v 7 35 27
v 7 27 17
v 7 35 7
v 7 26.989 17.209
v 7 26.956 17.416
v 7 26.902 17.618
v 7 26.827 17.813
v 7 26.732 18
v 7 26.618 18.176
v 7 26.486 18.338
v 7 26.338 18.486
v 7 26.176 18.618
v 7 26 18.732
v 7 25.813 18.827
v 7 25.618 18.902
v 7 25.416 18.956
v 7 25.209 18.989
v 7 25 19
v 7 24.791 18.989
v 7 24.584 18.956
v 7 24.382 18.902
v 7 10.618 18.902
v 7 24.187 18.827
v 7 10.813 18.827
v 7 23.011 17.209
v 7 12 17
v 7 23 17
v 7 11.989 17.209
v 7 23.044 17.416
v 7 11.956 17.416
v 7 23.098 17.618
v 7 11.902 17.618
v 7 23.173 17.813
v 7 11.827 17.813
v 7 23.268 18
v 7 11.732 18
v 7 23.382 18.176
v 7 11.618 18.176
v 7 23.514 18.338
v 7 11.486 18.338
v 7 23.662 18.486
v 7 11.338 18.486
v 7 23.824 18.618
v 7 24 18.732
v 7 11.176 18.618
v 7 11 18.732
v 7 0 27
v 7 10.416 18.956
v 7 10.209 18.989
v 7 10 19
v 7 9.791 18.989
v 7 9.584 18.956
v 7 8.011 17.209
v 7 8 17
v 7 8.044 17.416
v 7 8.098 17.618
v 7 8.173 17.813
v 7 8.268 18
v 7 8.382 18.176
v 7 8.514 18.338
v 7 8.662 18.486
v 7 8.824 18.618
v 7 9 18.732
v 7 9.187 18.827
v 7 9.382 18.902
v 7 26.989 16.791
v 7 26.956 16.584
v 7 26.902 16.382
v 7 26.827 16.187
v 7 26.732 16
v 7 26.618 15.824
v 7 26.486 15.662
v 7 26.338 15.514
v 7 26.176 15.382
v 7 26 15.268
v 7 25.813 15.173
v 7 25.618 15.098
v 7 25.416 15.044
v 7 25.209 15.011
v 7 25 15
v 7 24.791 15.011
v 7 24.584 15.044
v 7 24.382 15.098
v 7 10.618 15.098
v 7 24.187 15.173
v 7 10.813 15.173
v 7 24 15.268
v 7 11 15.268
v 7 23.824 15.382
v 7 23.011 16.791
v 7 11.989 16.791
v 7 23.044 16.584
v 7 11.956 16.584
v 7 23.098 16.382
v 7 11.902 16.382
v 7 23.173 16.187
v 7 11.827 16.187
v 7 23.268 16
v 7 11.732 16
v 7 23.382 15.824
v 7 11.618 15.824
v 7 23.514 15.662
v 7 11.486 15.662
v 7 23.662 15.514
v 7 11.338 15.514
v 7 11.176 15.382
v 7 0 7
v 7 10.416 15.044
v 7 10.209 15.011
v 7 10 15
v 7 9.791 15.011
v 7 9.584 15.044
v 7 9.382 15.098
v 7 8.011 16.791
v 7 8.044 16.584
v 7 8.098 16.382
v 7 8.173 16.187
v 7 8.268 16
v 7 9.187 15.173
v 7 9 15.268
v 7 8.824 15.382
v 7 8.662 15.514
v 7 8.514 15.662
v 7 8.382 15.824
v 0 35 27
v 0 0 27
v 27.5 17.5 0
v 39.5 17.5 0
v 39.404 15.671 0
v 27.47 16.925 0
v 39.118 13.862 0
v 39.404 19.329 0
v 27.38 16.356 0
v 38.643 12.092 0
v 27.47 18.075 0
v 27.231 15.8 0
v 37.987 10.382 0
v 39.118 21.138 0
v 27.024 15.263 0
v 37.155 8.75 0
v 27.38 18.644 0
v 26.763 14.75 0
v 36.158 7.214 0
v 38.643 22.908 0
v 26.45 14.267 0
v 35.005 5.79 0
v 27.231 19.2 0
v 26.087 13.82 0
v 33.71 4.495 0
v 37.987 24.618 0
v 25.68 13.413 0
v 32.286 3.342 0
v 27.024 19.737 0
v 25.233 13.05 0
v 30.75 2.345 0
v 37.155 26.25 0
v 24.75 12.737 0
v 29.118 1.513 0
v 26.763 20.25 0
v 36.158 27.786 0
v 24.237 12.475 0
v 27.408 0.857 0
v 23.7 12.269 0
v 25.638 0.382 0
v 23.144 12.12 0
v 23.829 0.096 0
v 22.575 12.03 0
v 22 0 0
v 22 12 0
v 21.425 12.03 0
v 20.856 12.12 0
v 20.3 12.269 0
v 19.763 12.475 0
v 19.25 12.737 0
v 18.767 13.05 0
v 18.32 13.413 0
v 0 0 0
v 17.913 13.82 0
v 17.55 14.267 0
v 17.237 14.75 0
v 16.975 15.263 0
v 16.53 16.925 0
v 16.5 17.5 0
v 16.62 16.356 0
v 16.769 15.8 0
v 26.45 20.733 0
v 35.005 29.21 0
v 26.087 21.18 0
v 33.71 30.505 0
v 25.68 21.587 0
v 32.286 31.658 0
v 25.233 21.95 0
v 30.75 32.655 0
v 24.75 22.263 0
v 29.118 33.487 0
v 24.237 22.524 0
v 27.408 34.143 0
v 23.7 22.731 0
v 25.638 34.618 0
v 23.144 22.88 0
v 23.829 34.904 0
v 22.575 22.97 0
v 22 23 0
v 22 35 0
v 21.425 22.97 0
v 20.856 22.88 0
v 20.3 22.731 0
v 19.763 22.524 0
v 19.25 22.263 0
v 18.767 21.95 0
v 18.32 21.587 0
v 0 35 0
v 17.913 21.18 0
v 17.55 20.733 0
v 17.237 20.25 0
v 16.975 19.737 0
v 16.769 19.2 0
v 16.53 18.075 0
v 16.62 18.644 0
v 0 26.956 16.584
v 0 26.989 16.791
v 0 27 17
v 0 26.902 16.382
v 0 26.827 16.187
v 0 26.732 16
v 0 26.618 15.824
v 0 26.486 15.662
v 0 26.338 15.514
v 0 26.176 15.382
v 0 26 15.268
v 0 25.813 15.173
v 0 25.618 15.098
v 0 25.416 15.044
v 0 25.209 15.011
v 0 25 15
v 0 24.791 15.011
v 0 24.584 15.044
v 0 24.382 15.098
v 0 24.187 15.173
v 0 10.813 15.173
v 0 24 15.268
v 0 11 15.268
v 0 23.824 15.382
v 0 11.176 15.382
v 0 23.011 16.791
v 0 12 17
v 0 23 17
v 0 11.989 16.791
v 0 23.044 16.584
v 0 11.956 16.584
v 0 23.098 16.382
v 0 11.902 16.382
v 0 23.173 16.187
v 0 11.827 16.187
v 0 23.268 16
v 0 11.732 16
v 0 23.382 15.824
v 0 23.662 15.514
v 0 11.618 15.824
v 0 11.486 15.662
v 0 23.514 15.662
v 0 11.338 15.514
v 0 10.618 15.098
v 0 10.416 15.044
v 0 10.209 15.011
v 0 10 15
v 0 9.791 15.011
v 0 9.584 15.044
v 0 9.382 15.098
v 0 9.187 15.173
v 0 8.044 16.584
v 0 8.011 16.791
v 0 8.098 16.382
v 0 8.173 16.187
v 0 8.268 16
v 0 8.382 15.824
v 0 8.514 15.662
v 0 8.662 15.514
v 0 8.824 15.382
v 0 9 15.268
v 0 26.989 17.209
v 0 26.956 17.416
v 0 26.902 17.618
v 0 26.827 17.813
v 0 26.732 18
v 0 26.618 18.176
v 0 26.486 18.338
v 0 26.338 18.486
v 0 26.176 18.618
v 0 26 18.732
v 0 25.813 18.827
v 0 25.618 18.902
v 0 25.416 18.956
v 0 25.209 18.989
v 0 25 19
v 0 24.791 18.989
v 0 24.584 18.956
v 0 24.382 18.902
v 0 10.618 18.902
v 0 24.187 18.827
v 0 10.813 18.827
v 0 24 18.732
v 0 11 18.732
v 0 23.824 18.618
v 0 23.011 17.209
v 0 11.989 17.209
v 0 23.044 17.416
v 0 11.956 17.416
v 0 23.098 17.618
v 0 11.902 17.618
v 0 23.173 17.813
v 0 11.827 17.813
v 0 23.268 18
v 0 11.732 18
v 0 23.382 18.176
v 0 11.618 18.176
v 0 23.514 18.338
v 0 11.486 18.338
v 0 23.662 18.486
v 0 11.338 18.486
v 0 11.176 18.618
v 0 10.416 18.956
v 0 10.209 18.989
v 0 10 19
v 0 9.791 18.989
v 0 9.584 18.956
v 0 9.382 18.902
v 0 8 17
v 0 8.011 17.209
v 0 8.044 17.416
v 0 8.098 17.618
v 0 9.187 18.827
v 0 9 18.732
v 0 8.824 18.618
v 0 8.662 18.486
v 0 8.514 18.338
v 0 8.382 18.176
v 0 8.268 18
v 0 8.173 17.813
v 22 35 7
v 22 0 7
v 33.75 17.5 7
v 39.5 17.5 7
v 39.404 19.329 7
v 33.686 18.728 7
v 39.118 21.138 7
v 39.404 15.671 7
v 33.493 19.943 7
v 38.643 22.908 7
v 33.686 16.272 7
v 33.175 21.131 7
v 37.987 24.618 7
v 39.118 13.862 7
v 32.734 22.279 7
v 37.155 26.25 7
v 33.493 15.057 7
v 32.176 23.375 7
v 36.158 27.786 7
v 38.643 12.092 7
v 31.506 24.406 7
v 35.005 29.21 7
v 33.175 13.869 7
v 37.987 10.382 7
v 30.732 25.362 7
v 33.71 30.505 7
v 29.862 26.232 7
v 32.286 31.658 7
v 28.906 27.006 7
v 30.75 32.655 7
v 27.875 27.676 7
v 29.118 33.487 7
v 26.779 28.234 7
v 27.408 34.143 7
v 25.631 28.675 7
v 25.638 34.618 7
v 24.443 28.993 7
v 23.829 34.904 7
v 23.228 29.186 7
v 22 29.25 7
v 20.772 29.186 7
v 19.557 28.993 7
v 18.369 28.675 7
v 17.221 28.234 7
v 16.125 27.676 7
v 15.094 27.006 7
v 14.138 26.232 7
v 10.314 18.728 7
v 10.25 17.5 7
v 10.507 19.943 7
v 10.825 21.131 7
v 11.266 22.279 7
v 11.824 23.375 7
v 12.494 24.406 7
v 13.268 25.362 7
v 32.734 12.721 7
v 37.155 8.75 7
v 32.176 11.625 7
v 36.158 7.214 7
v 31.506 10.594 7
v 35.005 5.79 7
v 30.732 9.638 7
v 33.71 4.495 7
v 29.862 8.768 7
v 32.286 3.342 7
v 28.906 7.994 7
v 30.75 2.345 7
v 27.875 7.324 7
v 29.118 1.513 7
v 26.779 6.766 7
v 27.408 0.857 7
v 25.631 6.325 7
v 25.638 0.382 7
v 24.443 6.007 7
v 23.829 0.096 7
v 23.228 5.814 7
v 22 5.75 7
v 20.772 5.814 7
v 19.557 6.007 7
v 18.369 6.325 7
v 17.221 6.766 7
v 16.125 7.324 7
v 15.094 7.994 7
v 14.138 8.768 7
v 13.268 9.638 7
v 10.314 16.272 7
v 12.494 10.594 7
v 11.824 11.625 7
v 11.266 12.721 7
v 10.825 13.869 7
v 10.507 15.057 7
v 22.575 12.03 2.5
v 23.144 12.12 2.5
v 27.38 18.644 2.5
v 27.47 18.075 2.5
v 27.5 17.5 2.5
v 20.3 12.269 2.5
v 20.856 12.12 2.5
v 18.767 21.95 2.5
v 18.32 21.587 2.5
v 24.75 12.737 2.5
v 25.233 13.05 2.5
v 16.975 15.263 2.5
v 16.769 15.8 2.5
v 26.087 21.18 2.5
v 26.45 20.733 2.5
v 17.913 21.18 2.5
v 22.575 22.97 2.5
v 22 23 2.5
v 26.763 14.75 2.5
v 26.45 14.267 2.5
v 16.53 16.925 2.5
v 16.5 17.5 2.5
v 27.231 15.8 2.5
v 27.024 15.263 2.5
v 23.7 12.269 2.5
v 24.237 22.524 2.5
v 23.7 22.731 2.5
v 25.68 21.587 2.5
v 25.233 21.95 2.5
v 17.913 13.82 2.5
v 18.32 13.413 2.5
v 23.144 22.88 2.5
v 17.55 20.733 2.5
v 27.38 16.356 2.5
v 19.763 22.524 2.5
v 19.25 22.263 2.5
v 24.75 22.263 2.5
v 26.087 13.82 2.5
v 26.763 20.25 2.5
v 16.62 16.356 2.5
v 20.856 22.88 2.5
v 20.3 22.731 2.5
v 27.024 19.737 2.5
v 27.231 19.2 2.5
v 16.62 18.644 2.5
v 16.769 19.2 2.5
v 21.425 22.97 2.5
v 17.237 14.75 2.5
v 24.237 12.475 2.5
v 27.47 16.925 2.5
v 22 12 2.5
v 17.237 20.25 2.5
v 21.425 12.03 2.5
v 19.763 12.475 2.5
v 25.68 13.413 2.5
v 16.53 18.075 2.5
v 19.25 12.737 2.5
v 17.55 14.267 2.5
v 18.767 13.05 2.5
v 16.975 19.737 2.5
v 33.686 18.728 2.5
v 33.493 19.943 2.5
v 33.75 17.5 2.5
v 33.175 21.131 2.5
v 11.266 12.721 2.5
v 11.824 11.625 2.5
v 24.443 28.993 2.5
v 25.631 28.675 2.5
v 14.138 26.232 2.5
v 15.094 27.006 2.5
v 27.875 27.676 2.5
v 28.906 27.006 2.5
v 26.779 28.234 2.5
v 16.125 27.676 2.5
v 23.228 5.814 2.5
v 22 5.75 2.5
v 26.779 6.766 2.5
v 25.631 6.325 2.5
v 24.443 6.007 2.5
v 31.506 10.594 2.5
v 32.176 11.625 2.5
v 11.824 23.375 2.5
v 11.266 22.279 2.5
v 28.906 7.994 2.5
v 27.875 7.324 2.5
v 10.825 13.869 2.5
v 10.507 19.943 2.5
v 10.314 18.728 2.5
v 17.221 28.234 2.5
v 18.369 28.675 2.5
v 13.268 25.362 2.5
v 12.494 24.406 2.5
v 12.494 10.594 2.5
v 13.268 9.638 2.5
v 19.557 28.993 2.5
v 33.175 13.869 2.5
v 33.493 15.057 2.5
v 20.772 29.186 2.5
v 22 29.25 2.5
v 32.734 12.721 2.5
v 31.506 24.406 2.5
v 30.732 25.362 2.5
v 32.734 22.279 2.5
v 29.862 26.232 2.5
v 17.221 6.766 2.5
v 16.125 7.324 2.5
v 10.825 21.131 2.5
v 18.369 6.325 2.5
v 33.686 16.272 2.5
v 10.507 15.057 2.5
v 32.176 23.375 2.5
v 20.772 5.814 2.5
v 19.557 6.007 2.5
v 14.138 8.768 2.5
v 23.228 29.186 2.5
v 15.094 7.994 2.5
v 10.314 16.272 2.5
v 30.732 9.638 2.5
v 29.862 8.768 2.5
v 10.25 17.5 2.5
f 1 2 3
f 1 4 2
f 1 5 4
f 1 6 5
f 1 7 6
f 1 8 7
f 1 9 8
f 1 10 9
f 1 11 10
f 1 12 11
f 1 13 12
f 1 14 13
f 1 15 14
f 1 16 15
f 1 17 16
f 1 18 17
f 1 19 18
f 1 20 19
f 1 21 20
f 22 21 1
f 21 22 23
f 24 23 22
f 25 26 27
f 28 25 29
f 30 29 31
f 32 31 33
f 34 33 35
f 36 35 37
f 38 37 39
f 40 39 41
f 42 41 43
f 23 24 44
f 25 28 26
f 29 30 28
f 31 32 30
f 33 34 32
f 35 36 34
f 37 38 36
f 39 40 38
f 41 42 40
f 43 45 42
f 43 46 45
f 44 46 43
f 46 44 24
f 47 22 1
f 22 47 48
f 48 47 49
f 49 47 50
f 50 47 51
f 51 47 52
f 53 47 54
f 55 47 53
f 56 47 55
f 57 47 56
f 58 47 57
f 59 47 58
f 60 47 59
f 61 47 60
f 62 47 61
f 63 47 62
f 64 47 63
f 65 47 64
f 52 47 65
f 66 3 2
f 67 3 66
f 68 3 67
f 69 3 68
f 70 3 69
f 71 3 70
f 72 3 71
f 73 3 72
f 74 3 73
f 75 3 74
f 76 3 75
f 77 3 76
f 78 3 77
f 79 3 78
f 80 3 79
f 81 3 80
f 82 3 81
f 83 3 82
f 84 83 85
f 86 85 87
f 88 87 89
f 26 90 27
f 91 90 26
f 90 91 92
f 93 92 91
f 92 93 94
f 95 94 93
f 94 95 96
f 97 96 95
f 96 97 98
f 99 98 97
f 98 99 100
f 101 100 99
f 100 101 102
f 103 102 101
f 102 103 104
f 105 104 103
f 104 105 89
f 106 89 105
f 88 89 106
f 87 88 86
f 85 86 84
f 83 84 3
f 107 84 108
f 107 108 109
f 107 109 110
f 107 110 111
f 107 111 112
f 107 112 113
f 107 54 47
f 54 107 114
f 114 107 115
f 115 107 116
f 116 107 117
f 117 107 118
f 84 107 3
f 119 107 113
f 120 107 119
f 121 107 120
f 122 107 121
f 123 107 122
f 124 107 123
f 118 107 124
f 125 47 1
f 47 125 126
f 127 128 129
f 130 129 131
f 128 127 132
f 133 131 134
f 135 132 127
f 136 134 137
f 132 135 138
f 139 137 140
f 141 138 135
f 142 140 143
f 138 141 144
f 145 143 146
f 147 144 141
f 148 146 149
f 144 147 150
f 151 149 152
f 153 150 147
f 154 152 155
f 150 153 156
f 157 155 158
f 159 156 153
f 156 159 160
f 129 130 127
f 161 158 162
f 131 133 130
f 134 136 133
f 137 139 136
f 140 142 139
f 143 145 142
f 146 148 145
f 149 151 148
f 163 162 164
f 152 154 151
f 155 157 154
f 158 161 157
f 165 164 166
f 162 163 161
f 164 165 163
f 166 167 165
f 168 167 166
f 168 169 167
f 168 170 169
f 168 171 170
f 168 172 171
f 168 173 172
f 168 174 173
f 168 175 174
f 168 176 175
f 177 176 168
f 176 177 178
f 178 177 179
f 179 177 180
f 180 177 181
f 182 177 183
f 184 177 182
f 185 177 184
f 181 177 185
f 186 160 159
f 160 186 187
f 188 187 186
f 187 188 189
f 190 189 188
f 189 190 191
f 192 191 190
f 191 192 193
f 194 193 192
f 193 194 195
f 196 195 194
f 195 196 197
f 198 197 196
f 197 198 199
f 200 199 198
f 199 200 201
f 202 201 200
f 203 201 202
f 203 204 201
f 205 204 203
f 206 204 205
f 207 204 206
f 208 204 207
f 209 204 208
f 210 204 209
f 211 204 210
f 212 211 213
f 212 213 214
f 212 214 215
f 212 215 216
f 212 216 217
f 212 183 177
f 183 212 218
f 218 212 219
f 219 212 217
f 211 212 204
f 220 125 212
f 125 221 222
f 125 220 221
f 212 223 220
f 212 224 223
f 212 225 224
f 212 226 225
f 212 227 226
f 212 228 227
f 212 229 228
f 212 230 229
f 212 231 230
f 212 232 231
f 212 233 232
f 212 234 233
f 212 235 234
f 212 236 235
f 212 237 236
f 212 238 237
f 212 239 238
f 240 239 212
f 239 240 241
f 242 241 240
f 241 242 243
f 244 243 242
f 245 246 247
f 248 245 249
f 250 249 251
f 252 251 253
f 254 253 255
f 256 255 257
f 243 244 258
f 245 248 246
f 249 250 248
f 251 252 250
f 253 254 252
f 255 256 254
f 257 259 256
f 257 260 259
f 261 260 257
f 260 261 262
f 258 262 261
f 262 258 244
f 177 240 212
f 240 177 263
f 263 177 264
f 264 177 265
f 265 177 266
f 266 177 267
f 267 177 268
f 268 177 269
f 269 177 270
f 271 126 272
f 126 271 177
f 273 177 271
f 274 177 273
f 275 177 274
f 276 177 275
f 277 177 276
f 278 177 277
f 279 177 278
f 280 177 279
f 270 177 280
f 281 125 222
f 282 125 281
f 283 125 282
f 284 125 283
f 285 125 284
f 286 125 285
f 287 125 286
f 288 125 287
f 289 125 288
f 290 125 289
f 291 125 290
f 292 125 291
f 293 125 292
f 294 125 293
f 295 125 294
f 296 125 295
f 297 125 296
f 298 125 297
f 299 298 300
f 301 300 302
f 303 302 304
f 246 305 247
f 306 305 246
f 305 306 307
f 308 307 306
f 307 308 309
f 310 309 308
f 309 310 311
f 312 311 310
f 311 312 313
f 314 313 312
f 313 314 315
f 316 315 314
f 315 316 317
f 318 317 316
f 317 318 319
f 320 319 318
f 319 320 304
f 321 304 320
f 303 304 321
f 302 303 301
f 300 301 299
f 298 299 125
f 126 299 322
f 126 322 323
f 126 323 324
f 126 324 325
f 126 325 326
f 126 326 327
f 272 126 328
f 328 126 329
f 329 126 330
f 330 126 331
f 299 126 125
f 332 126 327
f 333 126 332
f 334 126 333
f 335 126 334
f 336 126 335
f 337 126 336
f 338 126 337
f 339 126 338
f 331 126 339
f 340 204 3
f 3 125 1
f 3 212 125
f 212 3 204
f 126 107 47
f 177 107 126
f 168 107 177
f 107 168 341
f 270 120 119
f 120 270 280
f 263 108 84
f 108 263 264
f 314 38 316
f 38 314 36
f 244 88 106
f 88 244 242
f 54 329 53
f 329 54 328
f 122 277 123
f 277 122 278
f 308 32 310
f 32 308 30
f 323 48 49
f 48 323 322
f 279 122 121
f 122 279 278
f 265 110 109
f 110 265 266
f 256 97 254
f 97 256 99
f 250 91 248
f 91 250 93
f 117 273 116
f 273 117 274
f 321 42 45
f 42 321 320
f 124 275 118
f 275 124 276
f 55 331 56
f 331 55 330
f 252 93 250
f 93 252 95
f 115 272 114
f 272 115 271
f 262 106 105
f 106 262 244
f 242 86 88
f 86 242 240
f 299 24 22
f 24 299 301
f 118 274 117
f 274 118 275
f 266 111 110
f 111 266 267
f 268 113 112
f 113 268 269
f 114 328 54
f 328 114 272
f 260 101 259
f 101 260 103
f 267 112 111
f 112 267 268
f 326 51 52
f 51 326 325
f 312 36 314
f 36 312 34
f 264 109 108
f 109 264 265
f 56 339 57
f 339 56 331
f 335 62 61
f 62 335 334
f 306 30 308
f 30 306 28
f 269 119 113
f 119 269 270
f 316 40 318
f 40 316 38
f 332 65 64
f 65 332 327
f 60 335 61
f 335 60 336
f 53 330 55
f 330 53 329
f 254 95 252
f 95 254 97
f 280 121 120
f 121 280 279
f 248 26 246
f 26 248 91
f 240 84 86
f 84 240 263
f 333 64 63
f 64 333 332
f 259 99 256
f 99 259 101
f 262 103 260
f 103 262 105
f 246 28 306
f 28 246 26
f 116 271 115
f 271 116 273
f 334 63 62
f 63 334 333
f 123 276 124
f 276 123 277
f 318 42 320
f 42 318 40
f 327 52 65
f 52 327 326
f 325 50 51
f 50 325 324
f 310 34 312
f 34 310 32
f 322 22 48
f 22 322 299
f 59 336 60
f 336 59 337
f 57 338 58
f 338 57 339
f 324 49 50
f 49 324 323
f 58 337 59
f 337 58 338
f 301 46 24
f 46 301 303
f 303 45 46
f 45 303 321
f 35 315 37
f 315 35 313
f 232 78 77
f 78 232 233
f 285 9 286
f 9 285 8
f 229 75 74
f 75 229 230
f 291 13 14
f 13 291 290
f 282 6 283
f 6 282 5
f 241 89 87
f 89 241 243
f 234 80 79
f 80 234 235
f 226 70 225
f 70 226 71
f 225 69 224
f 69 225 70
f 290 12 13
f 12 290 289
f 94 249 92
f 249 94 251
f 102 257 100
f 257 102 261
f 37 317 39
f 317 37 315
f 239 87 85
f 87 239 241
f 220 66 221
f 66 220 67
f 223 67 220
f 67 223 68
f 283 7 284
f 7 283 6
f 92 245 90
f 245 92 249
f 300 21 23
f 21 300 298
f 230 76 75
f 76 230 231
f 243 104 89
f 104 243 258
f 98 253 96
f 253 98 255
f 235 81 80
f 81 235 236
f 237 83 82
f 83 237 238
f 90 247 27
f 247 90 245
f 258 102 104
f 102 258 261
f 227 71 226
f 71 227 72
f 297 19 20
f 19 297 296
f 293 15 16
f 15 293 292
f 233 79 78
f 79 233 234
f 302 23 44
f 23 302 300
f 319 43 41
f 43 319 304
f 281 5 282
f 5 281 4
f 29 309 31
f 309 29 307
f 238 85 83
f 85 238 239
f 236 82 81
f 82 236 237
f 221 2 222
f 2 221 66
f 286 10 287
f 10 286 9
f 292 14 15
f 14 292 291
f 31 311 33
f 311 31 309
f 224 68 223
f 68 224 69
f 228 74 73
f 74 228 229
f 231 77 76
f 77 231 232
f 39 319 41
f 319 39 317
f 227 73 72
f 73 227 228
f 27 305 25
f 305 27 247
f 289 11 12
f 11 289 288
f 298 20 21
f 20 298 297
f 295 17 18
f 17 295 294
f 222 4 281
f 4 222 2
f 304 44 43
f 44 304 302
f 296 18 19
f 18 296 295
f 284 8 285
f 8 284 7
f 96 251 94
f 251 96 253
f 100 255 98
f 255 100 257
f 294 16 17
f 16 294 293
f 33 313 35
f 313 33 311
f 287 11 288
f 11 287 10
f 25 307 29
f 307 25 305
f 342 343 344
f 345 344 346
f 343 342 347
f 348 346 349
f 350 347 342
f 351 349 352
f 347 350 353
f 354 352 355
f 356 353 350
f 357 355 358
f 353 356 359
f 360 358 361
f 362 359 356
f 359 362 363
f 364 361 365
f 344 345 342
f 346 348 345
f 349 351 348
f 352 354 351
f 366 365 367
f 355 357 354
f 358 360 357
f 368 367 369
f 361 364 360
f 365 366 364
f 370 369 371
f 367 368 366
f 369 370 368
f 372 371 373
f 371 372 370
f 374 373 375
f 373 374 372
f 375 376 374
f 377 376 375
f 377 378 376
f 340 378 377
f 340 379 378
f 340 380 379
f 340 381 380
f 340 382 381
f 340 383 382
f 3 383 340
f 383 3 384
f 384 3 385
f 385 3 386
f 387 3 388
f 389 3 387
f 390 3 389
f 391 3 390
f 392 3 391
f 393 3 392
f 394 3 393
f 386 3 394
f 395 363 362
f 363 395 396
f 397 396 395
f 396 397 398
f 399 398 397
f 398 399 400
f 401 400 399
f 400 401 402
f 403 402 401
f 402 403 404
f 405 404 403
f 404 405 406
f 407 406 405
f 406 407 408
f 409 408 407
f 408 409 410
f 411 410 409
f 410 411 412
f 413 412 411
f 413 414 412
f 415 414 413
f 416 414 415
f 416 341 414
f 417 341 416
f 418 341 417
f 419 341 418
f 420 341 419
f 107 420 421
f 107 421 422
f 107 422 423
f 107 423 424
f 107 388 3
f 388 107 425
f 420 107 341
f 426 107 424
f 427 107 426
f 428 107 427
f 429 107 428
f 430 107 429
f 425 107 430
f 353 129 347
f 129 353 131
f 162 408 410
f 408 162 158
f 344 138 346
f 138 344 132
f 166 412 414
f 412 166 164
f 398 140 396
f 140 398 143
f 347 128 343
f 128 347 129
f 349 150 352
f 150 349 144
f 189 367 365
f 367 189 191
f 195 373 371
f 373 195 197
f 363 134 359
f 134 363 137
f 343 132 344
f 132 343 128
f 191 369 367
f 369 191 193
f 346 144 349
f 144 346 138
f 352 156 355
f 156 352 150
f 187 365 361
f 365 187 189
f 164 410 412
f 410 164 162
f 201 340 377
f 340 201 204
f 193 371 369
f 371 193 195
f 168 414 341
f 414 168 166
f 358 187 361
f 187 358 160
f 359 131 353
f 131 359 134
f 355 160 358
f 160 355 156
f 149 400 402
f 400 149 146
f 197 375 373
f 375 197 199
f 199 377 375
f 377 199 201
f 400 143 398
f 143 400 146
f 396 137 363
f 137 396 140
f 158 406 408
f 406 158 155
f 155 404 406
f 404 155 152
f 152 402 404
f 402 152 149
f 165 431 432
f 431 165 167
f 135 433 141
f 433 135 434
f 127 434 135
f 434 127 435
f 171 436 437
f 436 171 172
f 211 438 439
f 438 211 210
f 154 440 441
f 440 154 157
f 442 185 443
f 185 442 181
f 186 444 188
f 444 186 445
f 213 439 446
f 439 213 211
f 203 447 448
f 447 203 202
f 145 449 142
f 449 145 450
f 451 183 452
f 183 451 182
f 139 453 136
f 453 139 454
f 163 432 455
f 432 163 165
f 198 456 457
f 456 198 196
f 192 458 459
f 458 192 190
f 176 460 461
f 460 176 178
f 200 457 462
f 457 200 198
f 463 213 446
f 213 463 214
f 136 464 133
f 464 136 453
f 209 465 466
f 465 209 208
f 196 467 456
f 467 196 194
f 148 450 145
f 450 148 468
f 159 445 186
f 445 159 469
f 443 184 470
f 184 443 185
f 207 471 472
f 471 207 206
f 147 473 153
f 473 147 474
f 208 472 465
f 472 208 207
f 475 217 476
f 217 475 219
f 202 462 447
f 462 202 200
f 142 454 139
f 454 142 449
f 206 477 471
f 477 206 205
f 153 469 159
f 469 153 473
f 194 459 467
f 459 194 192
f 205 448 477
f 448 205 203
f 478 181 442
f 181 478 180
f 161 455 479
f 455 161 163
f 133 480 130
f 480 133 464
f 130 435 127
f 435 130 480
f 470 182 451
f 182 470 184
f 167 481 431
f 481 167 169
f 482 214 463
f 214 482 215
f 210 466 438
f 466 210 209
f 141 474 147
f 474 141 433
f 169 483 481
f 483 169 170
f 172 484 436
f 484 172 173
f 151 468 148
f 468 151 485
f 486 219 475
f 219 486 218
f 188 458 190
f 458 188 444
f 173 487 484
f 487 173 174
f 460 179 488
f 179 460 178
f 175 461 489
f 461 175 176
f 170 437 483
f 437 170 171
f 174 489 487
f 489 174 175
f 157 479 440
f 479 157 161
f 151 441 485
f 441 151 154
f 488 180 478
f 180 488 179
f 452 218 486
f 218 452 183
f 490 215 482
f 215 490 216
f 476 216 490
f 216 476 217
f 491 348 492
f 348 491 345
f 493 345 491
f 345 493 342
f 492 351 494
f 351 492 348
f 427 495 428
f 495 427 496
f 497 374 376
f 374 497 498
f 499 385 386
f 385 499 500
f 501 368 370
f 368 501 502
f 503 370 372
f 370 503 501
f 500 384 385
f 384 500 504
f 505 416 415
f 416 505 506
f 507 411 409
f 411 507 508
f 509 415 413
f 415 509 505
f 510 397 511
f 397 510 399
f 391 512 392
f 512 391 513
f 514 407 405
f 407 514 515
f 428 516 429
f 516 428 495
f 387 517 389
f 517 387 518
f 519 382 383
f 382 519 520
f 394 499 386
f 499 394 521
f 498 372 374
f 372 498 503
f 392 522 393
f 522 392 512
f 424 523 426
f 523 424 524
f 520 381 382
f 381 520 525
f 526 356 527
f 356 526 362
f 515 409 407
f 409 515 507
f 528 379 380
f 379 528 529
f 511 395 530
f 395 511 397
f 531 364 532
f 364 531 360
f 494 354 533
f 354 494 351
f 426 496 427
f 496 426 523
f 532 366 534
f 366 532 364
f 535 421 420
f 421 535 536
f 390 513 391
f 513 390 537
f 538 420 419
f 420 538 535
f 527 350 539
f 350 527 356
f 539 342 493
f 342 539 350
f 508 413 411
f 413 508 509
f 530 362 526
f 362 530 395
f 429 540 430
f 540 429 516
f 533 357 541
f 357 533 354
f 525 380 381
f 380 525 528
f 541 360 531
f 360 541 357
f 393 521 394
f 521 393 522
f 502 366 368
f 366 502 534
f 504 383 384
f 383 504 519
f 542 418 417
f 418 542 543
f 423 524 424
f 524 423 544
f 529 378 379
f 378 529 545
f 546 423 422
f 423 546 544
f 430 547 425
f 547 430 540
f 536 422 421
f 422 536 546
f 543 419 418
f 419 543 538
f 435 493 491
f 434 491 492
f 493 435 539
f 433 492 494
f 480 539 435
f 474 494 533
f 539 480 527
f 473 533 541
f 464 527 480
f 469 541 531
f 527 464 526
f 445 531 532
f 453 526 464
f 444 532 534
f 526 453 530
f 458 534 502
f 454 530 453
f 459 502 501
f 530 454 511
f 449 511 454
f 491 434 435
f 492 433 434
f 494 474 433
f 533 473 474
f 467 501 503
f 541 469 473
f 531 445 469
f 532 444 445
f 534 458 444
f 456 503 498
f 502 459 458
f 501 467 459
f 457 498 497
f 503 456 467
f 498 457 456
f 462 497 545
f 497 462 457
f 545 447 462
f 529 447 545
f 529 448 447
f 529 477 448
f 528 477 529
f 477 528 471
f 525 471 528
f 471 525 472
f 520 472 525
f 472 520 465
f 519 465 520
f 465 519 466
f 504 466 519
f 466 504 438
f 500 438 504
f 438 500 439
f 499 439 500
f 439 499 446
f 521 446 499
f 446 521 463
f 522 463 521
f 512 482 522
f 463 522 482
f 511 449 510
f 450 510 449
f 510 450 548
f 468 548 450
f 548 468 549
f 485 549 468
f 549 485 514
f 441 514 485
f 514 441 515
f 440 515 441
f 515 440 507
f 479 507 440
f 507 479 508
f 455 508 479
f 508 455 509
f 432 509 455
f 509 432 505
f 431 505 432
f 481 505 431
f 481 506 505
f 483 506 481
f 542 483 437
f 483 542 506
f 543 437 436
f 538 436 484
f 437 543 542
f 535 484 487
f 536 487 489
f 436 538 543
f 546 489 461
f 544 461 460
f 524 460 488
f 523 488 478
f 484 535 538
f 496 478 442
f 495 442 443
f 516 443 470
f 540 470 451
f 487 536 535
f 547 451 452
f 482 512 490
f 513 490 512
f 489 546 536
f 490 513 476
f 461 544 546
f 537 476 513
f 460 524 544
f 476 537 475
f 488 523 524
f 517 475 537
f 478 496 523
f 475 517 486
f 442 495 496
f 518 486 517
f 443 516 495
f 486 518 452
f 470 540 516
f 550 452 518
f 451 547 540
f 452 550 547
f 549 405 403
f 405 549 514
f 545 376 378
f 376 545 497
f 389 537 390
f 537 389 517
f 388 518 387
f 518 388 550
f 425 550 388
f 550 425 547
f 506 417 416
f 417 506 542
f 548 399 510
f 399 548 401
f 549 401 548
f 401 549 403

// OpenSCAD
// Licence: GNU General Public License version 2 (GPLv2)
$fn = 60;

base = 7;
d_arc = 15;
height = 30;
copies = 1;

// Paramewters for valve
d_valve = 11;
// inset is necessary for e.g. needle valves
inset = 1; // 1 .. yes; 0 .. no
h_inset = base-2.5;
d_inset = 23.5;


for(i=[0:copies-1]){
    translate([0, 2*(d_arc/2+10)*i,0]) {
        holder();
    }
}


module holder()
{
    difference() {
        cube([7, 2*(d_arc/2+10), base+20]);
        translate([-1, 10, base+10]) {
            rotate(a = [0,90,0]) {
                cylinder(r=2, h=base+2);
            }
        }
        translate([-1, 2*(d_arc/2+10)-10, base+10]) {
            rotate(a = [0,90,0]) {
                cylinder(r=2, h=base+2);
            }
        }
    }
    difference() {
        union(){
            cube([base+height/2, 2*(d_arc/2+10), base]);
            translate([base+height/2, (d_arc/2+10), 0]) {
                cylinder(r=d_arc/2+10, h=base);
            }
        }
        translate([base+height/2, (d_arc/2+10), -1]) {
            cylinder(r=d_valve/2, h=base+2);
        }
        if(inset==1){
            translate([base+height/2, (d_arc/2+10), base-h_inset]){
                cylinder(r=d_inset/2, h=h_inset+1);
            }
        }
    }
}
